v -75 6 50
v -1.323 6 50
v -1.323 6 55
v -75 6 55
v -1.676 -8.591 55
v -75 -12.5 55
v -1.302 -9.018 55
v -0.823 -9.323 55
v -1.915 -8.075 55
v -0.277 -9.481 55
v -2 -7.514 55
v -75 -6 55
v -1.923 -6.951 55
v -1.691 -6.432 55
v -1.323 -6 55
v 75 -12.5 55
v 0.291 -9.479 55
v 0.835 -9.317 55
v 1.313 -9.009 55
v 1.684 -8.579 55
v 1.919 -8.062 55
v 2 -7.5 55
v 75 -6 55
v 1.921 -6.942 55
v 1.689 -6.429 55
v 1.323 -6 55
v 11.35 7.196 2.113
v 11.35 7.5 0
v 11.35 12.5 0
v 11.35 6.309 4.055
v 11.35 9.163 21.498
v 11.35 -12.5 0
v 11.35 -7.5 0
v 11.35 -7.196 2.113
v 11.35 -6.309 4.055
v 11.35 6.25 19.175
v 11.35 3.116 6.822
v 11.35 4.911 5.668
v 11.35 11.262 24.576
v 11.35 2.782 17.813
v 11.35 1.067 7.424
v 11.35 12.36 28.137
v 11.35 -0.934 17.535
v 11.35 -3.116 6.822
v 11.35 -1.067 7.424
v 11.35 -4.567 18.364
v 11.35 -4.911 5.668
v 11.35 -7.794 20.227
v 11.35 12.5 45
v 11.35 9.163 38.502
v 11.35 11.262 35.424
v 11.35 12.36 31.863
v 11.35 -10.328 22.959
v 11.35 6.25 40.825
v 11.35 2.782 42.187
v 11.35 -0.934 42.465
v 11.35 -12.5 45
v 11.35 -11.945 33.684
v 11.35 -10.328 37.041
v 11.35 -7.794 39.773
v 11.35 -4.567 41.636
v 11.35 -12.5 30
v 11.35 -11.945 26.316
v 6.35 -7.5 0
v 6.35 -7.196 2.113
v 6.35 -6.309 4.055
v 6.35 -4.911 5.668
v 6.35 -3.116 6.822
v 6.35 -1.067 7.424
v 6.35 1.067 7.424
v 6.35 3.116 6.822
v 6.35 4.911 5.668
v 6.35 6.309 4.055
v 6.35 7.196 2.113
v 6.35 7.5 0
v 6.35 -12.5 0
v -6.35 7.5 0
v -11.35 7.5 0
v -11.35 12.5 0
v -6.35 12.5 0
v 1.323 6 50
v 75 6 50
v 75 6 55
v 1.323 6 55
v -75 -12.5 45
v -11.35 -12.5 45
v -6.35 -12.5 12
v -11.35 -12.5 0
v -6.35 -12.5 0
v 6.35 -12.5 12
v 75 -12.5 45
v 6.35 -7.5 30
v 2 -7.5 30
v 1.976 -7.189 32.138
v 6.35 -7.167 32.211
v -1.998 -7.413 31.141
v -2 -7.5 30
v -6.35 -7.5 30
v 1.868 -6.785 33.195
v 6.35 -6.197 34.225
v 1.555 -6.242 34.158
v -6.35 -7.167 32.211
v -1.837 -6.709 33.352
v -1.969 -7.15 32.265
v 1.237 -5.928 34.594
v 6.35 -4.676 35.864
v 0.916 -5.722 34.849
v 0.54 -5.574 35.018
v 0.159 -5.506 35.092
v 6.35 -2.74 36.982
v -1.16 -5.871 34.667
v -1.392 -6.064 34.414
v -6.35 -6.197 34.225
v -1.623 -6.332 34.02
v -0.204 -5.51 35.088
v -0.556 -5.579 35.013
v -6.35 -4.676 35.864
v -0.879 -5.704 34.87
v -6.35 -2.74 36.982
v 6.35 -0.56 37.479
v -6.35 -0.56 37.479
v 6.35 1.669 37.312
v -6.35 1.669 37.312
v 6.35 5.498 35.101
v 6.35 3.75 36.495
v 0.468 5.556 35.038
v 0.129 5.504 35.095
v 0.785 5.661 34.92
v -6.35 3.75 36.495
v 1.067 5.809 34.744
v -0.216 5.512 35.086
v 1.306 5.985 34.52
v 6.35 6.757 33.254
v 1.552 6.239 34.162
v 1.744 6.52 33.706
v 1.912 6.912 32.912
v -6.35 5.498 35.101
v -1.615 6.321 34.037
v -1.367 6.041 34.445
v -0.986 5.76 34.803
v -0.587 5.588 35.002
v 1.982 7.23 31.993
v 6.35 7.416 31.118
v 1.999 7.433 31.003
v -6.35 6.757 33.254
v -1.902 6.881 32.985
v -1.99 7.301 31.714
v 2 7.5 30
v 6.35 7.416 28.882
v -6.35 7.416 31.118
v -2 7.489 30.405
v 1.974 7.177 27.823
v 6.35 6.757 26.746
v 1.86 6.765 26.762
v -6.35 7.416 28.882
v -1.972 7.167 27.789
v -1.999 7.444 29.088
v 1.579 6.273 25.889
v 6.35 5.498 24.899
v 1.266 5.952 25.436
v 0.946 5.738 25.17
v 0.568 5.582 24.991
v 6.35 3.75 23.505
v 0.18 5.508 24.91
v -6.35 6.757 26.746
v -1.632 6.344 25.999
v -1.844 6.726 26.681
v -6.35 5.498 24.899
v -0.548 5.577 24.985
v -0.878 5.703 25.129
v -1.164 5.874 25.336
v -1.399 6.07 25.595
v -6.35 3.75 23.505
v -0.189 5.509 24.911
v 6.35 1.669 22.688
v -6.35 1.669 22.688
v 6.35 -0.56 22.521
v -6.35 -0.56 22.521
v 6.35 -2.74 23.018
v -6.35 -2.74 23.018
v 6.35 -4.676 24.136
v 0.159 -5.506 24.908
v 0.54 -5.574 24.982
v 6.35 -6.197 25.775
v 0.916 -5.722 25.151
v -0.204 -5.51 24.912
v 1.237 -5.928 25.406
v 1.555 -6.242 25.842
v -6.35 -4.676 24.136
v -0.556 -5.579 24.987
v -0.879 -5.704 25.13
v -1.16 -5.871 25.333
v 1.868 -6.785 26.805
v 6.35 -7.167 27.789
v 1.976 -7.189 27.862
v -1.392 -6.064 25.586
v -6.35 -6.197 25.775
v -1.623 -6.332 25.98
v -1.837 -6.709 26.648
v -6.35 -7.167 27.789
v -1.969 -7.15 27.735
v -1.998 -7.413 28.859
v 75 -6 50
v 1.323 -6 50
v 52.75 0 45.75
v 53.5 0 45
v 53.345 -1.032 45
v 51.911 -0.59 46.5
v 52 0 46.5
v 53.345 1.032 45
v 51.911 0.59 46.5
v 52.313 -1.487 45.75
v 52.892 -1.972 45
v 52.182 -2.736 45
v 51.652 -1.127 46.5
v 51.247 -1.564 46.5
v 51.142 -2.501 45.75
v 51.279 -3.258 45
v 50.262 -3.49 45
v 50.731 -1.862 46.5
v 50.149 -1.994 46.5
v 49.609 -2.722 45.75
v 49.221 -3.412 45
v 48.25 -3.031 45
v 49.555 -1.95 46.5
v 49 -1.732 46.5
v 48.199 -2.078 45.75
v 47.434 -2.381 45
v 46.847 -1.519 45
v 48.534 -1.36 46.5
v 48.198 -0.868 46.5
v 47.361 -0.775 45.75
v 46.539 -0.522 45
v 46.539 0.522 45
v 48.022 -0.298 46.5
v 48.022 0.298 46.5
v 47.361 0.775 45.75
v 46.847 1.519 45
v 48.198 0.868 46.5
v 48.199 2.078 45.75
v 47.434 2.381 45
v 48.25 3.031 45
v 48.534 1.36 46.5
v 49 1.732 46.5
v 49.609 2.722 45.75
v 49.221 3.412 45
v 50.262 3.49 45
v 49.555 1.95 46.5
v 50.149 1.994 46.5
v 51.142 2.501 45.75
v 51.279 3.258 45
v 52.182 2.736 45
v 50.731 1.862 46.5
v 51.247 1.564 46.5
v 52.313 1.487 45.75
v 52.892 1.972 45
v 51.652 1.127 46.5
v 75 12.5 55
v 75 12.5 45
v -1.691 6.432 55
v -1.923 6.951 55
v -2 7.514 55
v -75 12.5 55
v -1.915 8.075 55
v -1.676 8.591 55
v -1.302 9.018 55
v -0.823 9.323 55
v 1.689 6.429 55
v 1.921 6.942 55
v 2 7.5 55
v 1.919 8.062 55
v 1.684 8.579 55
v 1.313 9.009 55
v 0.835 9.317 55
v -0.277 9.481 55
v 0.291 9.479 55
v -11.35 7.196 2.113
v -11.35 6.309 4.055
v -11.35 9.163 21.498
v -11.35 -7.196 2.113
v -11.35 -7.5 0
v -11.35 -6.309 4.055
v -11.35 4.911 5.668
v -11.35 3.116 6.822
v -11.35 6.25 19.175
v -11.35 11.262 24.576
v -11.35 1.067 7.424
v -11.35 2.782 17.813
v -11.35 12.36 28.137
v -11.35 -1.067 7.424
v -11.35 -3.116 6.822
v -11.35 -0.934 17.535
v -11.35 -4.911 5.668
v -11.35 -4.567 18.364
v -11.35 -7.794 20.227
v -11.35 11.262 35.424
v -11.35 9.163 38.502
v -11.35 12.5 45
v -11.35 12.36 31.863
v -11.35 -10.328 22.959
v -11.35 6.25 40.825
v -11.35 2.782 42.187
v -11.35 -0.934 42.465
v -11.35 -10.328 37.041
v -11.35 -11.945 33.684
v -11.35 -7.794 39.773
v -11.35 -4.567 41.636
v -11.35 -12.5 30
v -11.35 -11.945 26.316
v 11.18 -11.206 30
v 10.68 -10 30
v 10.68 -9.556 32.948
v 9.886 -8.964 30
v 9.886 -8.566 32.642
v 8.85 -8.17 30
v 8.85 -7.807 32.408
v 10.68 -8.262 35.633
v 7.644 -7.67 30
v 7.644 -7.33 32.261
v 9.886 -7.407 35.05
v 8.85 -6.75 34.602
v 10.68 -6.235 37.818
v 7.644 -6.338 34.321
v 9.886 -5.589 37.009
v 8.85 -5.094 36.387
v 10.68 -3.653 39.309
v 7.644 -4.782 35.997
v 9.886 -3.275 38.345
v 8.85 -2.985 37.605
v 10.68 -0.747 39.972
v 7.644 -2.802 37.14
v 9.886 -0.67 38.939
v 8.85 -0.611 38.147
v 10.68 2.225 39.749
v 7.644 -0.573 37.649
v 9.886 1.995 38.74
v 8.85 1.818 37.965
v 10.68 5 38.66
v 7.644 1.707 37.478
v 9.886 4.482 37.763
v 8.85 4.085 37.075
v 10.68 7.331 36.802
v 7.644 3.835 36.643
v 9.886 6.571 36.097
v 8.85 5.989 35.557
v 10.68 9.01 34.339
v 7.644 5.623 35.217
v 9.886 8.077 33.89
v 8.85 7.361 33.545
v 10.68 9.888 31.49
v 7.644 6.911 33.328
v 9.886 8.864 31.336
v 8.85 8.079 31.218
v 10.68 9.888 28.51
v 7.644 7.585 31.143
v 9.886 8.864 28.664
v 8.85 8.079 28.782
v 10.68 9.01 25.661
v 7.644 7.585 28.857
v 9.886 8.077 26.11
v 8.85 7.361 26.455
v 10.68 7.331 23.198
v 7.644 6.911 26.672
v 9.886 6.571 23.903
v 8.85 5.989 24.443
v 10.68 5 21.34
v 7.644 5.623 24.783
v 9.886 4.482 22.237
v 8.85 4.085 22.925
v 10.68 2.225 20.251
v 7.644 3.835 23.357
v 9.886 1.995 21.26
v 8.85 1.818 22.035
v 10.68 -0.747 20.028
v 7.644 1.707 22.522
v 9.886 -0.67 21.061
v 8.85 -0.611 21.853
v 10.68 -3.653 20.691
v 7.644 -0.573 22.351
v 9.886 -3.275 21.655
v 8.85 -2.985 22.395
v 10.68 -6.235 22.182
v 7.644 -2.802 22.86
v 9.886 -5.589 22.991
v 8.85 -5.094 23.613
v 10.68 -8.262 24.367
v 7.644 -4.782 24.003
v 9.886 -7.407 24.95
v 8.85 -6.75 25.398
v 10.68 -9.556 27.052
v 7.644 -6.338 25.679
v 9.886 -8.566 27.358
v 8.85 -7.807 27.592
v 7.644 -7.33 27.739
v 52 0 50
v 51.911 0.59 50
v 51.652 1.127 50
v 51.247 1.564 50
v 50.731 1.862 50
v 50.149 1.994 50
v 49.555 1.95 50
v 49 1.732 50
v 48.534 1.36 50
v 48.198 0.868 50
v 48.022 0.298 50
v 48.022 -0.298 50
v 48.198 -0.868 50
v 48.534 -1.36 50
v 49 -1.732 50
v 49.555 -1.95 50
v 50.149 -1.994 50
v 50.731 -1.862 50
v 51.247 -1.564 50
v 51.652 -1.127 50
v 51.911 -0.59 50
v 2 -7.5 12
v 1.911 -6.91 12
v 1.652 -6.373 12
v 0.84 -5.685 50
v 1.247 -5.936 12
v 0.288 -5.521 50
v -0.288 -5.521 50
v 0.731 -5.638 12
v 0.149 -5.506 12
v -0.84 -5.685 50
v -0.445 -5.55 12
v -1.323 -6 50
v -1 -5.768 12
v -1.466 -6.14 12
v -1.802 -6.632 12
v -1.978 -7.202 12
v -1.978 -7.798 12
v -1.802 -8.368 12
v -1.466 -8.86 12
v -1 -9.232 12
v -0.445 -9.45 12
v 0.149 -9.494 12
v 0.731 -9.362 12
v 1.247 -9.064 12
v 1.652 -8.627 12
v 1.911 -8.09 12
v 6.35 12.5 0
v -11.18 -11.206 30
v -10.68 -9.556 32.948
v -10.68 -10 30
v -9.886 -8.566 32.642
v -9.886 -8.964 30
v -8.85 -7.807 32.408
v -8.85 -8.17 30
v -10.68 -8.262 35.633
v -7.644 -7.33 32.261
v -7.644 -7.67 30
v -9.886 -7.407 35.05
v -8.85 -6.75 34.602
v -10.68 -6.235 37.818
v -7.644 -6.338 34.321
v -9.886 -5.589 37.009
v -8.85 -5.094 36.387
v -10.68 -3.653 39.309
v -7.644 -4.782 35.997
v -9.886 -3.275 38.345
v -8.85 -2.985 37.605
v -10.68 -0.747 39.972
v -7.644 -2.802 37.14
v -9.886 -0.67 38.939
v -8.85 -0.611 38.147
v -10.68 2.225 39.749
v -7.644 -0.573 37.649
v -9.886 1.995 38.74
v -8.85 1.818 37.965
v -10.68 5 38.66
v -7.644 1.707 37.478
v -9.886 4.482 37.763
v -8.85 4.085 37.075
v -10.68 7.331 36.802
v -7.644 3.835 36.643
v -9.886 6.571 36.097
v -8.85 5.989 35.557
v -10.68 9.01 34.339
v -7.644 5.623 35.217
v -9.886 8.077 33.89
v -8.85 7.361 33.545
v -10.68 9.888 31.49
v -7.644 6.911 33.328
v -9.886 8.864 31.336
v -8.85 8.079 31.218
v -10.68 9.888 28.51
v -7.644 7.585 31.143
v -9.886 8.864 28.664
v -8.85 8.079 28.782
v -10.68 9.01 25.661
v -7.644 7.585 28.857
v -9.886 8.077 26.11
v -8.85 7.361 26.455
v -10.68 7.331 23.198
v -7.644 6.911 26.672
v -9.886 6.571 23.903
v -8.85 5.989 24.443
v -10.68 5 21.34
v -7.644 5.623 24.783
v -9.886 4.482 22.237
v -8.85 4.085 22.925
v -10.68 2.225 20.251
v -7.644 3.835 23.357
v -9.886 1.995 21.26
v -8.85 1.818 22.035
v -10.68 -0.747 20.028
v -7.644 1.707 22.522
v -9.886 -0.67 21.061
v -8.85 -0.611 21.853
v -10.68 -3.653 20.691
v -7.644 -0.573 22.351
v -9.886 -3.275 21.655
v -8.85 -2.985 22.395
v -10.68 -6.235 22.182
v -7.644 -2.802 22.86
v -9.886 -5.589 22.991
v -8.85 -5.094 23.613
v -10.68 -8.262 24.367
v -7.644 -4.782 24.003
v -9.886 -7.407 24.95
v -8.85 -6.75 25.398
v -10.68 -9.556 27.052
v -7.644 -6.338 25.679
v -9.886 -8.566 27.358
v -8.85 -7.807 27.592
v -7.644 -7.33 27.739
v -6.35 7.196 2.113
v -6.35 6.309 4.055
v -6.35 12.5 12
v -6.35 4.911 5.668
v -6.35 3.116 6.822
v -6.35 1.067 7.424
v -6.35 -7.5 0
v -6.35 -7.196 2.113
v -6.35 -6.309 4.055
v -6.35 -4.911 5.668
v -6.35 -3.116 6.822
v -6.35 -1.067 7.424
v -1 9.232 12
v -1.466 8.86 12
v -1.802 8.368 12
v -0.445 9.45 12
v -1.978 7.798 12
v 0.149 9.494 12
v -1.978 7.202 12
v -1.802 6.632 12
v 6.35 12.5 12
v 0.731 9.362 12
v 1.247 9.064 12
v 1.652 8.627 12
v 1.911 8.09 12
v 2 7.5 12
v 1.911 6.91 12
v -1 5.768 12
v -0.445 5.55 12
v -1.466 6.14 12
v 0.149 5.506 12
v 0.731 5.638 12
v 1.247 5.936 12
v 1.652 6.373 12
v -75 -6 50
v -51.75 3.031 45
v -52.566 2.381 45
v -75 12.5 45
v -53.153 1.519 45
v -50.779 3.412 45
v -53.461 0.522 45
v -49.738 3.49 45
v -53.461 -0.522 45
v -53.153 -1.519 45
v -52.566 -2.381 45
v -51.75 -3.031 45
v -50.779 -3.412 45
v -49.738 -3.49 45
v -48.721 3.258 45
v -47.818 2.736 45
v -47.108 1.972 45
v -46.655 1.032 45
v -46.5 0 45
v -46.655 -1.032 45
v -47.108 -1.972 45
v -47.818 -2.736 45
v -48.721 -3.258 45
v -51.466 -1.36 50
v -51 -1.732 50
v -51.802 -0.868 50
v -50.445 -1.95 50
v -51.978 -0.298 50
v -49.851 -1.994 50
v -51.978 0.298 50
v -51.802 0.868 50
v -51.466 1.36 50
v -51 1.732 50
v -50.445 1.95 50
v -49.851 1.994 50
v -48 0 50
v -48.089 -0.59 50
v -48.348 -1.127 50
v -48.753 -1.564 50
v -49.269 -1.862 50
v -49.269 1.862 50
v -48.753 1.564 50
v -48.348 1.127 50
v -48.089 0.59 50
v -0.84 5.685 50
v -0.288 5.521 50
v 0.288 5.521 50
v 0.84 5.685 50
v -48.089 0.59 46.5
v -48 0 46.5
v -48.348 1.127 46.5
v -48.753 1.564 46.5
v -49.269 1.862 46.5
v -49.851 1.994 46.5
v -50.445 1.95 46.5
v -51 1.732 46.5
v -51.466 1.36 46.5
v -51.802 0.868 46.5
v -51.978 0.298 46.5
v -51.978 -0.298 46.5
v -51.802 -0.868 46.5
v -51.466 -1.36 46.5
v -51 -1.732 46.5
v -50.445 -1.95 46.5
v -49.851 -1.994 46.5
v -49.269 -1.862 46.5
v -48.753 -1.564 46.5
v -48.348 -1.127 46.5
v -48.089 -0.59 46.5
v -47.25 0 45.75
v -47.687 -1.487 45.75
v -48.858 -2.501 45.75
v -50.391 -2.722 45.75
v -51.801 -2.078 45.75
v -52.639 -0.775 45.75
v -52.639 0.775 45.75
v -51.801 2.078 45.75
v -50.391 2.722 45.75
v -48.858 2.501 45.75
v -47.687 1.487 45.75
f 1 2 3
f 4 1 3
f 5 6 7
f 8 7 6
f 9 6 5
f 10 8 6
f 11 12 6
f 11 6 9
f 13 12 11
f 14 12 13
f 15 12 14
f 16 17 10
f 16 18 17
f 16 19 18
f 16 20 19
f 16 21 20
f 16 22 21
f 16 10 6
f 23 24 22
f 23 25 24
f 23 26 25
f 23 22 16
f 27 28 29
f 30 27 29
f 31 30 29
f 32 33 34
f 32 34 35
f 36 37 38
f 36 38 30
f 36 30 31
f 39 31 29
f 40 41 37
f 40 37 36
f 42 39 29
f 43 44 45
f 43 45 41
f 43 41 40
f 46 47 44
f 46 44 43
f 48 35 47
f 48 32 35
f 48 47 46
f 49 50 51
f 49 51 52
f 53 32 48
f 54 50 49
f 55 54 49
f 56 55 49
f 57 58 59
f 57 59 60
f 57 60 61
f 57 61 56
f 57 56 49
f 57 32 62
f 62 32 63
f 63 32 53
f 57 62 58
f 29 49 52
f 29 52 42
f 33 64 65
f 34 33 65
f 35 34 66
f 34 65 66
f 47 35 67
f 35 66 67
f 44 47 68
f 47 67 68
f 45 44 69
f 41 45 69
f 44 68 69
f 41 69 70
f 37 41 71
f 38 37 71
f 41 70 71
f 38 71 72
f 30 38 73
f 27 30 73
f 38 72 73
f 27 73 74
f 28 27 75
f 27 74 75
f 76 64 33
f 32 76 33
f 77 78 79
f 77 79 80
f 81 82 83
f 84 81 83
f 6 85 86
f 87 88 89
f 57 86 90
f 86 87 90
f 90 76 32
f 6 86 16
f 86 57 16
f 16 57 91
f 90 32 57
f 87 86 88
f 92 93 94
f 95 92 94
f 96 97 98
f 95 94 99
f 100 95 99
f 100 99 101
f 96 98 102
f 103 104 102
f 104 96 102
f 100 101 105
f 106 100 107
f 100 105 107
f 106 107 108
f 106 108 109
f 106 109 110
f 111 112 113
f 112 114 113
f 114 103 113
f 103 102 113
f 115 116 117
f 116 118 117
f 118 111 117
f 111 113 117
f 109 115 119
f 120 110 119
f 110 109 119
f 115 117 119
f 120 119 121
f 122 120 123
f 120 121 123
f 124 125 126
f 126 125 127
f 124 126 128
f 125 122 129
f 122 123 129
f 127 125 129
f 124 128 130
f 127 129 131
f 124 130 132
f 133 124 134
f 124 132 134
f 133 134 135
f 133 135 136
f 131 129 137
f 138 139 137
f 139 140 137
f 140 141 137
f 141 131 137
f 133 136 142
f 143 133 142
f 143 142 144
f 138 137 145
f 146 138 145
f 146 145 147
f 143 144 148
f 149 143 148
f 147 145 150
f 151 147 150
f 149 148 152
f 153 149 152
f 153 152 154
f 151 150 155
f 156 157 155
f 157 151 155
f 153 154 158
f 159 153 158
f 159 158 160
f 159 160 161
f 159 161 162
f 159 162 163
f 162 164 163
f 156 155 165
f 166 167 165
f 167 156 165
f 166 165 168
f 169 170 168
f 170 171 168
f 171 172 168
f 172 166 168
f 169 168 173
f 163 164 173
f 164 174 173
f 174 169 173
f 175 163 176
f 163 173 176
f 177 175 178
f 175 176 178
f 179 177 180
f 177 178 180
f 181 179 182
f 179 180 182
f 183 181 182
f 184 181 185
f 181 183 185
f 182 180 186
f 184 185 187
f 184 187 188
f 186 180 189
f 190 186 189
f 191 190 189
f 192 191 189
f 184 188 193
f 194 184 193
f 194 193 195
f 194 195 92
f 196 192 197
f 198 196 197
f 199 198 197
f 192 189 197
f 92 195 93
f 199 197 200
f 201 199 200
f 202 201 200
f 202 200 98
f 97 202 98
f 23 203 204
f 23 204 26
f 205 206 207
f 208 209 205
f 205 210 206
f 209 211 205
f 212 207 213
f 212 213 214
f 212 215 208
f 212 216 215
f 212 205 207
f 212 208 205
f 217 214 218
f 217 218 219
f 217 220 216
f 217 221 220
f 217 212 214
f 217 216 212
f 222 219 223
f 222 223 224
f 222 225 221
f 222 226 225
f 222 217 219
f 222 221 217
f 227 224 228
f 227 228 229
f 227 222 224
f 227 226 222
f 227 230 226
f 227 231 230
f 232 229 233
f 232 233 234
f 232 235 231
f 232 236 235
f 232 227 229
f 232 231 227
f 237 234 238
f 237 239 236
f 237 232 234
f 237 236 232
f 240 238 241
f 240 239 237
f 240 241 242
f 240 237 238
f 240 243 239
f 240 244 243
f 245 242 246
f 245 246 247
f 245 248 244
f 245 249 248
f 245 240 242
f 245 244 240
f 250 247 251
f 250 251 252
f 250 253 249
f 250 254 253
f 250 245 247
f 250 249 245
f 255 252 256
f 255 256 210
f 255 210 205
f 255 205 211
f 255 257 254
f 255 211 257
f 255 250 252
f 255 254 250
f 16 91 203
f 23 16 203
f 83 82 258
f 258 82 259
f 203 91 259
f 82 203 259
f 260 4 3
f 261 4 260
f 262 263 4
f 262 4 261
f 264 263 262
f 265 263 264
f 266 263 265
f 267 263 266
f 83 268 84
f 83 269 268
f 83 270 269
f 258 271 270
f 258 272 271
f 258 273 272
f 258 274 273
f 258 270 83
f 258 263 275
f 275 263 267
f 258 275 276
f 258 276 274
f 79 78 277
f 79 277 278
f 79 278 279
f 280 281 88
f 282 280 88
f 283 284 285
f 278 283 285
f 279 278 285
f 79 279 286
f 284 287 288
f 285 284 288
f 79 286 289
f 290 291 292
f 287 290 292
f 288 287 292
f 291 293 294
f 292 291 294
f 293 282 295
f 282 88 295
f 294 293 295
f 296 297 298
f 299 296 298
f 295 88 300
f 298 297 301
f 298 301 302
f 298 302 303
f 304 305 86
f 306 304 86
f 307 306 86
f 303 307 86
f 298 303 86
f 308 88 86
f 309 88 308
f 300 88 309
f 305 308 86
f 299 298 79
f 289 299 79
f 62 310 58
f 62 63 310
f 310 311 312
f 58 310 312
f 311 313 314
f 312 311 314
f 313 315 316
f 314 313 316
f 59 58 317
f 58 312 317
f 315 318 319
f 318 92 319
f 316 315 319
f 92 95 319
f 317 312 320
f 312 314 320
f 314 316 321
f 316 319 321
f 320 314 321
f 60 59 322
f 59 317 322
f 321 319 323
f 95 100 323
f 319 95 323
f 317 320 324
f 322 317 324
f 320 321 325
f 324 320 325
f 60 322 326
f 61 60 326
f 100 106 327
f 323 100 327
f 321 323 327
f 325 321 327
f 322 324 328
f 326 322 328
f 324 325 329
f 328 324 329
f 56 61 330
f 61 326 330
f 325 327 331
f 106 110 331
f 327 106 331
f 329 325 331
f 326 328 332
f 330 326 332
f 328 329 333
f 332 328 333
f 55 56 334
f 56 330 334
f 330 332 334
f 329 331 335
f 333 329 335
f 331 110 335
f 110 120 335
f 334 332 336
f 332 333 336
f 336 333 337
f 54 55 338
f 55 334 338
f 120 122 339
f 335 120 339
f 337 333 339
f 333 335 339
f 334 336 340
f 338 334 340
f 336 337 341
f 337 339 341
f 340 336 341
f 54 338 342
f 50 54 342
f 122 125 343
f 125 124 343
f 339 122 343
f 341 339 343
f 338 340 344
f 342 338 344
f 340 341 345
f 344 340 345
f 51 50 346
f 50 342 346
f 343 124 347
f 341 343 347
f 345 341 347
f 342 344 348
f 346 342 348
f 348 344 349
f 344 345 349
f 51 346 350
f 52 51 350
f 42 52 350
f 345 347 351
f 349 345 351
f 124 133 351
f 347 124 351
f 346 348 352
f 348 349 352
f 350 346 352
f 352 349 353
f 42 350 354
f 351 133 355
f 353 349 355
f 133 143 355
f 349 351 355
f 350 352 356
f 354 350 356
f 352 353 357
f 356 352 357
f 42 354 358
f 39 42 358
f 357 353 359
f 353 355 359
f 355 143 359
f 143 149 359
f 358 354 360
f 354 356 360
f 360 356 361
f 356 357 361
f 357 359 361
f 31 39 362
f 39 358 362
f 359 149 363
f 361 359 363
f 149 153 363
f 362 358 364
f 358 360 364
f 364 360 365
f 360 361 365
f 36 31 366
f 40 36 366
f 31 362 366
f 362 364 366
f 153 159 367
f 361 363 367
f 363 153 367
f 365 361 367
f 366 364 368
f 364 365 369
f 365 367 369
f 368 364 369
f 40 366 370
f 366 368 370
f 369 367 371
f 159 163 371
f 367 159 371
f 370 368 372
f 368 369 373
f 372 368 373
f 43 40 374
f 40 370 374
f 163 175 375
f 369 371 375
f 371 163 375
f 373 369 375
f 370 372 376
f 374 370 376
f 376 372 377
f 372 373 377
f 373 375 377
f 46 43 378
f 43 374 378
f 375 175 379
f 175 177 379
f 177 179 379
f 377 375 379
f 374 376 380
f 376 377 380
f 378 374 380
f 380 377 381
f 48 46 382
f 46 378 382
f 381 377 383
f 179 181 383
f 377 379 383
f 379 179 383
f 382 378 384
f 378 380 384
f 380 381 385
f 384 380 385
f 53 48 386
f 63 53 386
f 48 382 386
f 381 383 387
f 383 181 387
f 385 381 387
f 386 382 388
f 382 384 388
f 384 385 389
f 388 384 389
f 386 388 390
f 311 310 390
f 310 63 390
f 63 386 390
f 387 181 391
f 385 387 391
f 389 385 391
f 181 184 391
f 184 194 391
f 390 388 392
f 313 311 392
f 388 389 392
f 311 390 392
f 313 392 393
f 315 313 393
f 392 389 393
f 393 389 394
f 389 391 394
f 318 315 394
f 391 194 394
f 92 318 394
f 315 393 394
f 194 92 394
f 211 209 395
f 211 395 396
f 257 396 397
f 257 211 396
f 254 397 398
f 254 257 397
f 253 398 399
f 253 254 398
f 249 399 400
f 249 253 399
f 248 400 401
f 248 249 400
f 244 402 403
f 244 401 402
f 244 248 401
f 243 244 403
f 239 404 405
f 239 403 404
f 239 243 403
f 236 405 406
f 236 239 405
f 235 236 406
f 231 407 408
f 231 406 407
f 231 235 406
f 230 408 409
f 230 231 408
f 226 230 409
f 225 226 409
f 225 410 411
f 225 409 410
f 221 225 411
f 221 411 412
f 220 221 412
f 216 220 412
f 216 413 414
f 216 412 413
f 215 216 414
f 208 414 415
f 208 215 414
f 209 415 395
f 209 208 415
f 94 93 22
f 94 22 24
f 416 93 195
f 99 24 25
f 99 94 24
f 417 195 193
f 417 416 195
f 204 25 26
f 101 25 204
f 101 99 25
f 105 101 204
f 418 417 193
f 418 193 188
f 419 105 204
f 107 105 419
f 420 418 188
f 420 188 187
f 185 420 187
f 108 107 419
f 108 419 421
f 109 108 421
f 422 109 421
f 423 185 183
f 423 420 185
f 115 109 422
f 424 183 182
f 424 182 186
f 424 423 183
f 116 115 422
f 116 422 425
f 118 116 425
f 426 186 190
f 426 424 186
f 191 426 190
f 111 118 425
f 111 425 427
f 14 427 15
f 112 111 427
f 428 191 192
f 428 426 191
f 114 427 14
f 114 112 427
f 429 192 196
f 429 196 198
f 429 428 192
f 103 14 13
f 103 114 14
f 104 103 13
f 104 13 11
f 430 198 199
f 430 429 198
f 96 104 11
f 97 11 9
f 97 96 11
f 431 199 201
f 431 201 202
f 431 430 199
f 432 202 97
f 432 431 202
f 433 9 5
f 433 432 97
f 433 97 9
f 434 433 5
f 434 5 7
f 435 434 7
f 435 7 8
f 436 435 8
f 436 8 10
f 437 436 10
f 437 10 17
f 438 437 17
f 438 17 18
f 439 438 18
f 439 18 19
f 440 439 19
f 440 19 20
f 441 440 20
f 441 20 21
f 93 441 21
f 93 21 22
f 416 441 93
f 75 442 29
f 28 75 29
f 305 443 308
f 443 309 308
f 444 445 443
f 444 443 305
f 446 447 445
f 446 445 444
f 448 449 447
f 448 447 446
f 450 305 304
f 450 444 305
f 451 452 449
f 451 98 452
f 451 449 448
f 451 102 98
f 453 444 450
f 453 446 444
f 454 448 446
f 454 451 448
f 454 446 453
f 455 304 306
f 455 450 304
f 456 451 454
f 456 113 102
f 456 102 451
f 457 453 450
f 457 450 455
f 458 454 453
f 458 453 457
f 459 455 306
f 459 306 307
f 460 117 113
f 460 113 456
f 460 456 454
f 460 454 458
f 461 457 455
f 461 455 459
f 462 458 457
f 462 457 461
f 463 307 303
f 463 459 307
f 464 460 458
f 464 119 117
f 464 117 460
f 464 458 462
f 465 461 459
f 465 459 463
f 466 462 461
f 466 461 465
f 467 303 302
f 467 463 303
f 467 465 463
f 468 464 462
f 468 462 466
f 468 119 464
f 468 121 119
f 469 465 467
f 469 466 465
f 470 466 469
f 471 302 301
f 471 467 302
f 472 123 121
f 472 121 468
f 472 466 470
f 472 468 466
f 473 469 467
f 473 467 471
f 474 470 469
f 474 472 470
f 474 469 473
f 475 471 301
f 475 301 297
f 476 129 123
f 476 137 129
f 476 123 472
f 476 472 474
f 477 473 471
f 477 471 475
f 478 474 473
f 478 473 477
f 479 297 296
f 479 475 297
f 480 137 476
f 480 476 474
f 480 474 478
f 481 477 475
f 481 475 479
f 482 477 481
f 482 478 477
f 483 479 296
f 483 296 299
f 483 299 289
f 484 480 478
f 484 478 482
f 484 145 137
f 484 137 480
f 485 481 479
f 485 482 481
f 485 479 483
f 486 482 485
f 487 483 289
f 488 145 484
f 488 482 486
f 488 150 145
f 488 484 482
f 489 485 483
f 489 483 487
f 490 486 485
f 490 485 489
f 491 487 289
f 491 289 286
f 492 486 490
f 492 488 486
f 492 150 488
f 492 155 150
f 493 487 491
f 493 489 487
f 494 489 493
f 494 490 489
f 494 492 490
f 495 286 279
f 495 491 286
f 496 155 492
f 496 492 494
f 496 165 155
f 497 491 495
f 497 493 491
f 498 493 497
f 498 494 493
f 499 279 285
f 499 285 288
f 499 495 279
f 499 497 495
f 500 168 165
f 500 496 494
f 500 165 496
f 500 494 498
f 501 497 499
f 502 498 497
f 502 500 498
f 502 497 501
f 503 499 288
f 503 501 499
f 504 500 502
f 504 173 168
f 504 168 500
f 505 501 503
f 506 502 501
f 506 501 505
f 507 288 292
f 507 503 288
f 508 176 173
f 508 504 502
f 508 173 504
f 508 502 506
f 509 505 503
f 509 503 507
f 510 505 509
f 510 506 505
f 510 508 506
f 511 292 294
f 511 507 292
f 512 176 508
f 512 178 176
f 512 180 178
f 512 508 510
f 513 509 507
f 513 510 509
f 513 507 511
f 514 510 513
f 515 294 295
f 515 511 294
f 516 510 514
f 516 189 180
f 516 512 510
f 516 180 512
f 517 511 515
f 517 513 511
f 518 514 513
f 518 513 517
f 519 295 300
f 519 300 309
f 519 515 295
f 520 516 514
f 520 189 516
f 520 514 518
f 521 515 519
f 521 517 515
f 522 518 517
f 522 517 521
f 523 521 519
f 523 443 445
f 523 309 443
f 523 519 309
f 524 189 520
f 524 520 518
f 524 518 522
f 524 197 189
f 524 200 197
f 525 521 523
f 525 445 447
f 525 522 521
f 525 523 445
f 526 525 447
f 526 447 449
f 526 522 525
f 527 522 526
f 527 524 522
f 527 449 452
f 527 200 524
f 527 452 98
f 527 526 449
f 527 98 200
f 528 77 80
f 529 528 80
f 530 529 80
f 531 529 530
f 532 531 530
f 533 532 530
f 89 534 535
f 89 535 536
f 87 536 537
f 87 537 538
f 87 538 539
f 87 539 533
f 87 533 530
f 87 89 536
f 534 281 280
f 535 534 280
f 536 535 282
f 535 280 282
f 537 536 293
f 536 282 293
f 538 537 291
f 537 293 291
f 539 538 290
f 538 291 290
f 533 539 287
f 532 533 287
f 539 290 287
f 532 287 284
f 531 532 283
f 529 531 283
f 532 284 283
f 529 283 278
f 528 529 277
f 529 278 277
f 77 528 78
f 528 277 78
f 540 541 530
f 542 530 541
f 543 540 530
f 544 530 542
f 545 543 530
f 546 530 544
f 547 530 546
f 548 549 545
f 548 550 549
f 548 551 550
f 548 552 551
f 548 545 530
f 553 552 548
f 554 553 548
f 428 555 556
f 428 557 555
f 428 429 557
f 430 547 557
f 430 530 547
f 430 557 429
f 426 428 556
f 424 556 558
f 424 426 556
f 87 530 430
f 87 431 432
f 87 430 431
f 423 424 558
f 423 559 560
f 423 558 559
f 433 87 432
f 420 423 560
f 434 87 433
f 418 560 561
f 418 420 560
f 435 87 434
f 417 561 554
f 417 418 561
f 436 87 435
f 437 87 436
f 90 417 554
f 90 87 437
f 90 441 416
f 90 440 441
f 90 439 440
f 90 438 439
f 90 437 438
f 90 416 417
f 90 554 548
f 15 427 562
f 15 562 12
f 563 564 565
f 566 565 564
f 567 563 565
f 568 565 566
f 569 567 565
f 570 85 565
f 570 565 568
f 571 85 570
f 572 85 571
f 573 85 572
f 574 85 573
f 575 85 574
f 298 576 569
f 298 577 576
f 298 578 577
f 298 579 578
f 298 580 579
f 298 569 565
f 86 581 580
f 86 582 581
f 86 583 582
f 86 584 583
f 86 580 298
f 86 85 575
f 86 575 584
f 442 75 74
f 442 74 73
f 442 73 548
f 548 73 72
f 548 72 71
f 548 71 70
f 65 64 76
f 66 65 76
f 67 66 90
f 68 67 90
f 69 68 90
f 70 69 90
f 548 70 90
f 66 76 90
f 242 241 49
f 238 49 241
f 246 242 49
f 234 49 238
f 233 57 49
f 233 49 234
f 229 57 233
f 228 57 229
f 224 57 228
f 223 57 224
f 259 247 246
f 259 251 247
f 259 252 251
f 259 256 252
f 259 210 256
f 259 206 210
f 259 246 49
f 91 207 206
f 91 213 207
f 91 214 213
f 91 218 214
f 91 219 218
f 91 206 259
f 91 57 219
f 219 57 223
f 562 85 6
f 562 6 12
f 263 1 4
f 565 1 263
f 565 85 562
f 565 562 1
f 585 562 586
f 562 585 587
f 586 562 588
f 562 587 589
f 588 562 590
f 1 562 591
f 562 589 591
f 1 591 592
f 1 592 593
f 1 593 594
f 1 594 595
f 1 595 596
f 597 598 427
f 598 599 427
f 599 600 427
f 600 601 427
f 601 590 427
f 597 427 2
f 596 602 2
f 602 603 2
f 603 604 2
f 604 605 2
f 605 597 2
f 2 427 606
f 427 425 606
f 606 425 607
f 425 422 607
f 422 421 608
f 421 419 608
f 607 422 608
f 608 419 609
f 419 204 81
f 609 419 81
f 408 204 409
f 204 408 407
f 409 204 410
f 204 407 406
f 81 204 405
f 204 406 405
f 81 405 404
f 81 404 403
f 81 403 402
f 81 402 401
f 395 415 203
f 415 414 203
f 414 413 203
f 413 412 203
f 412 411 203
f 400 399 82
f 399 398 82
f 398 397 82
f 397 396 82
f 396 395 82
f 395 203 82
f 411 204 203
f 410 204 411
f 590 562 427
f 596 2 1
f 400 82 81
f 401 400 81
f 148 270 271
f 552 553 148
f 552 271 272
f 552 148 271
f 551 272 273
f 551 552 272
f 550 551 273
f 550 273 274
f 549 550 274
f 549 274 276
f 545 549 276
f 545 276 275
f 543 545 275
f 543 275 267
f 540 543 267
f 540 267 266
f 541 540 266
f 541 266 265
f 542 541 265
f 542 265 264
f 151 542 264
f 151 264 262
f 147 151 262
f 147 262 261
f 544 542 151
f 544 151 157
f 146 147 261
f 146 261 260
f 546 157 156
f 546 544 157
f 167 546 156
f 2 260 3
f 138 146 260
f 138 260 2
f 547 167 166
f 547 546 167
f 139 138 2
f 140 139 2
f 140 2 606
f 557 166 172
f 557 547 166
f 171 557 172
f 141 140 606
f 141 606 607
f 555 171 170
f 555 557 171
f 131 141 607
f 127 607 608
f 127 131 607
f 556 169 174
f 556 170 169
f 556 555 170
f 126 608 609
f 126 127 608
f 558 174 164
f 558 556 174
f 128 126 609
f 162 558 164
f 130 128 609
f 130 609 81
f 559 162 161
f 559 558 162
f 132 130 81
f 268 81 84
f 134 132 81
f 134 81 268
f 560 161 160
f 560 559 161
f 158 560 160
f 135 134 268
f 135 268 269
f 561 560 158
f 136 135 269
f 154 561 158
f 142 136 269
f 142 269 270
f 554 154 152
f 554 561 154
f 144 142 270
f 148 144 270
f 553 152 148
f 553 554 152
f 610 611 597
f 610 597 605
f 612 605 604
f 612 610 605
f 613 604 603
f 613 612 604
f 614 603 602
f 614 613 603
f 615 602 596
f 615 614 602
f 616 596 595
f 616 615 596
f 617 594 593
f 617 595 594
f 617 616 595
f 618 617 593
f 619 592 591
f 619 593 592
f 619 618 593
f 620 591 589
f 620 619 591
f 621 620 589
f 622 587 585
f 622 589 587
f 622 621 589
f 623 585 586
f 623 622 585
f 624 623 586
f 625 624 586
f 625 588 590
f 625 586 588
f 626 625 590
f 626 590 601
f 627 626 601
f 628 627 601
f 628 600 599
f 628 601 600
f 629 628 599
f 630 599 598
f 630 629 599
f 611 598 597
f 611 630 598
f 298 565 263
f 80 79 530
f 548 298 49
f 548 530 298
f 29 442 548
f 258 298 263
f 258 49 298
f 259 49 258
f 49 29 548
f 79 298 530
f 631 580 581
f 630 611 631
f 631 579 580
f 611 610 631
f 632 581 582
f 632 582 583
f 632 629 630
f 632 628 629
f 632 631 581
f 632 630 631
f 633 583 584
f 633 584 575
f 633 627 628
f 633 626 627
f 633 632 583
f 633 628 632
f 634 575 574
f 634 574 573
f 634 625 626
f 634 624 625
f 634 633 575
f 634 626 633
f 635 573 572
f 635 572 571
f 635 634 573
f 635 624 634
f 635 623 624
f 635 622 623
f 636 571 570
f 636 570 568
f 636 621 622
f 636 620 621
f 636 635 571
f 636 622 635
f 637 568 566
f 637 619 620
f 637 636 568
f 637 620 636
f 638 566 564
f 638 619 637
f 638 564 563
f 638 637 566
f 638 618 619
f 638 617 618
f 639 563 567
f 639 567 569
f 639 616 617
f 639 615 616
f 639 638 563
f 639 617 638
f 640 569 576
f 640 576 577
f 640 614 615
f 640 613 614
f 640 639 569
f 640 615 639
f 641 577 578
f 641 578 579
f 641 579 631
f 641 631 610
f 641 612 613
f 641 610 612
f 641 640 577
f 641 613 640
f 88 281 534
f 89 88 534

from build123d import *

# Parameters (mm, degrees)
F0_W     = 150
F0_H     = 25
F0_R     = 2
F1_DEPTH = 55
F2_W     = 12
F2_H     = 5
F3_DEPTH = 150.001
F4_W     = 63.65
F4_H     = 45
F4_W_2   = 12.7
F4_H_2   = 12
F5_DEPTH = 25.001
F7_DEPTH = 86.351
F6_R     = 7.5
F8_DEPTH = 86.351
F9_R     = 4.99999
F10_SIZE = 1.5


# Not quite as in the source:
# - a fillet or chamfer is up to 0.001 mm smaller than in the source, because OpenCascade refuses the exact size


with BuildPart() as f1:
    # F0 (on Top) → F1 (new body)
    with BuildSketch(Plane.XY):
        Rectangle(F0_W, F0_H)
        with Locations((0, -7.5)):
            Circle(F0_R, mode=Mode.SUBTRACT)
        with Locations((-50, 0)):
            Circle(F0_R, mode=Mode.SUBTRACT)
        with Locations((50, 0)):
            Circle(F0_R, mode=Mode.SUBTRACT)
        with Locations((0, 7.5)):
            Circle(F0_R, mode=Mode.SUBTRACT)
    extrude(amount=F1_DEPTH)

    # F2 (on face) → F3 (cut, through all)
    with BuildSketch(Plane.YZ.offset(75)):
        with Locations((0, 52.5)):
            Rectangle(F2_W, F2_H)
    extrude(amount=-F3_DEPTH, mode=Mode.SUBTRACT)

    # F4 (on face) → F5 (cut, through all)
    with BuildSketch(Plane.XZ.offset(12.5)):
        with Locations((43.175, 22.5)):
            Rectangle(F4_W, F4_H)
        with Locations((-43.175, 22.5)):
            Rectangle(F4_W, F4_H)
        with Locations((0, 6)):
            Rectangle(F4_W_2, F4_H_2)
    extrude(amount=-F5_DEPTH, mode=Mode.SUBTRACT)

    # F6 (on face) → F7 (cut, through all)
    with BuildSketch(Plane(origin=(-11.35, 0, 0), x_dir=(0, -1, 0), z_dir=(-1, 0, 0))):
        with BuildLine():
            Line((-7.5, 0), (7.5, 0))
            ThreePointArc((7.5, 0), (0, 7.5), (-7.5, 0))
        make_face()
    extrude(amount=-F7_DEPTH, mode=Mode.SUBTRACT)

    # F6 (on face) → F8 (cut, through all)
    with BuildSketch(Plane(origin=(-11.35, 0, 0), x_dir=(0, -1, 0), z_dir=(-1, 0, 0))):
        with Locations((0, 30)):
            Circle(F6_R)
    extrude(amount=-F8_DEPTH, mode=Mode.SUBTRACT)

    # F9 (radius 5 in the source; OpenCascade refuses exactly that, so slightly less here)
    f9_edges = [f1.edges().sort_by_distance(p)[0] for p in [
        (-11.35, 7.5, 30),
        (11.35, 7.5, 30),
    ]]
    fillet(f9_edges, radius=F9_R)

    # F10
    f10_edges = [f1.edges().sort_by_distance(p)[0] for p in [
        (48, 0, 45),
        (-52, 0, 45),
    ]]
    chamfer(f10_edges, length=F10_SIZE)


solid = f1.part
